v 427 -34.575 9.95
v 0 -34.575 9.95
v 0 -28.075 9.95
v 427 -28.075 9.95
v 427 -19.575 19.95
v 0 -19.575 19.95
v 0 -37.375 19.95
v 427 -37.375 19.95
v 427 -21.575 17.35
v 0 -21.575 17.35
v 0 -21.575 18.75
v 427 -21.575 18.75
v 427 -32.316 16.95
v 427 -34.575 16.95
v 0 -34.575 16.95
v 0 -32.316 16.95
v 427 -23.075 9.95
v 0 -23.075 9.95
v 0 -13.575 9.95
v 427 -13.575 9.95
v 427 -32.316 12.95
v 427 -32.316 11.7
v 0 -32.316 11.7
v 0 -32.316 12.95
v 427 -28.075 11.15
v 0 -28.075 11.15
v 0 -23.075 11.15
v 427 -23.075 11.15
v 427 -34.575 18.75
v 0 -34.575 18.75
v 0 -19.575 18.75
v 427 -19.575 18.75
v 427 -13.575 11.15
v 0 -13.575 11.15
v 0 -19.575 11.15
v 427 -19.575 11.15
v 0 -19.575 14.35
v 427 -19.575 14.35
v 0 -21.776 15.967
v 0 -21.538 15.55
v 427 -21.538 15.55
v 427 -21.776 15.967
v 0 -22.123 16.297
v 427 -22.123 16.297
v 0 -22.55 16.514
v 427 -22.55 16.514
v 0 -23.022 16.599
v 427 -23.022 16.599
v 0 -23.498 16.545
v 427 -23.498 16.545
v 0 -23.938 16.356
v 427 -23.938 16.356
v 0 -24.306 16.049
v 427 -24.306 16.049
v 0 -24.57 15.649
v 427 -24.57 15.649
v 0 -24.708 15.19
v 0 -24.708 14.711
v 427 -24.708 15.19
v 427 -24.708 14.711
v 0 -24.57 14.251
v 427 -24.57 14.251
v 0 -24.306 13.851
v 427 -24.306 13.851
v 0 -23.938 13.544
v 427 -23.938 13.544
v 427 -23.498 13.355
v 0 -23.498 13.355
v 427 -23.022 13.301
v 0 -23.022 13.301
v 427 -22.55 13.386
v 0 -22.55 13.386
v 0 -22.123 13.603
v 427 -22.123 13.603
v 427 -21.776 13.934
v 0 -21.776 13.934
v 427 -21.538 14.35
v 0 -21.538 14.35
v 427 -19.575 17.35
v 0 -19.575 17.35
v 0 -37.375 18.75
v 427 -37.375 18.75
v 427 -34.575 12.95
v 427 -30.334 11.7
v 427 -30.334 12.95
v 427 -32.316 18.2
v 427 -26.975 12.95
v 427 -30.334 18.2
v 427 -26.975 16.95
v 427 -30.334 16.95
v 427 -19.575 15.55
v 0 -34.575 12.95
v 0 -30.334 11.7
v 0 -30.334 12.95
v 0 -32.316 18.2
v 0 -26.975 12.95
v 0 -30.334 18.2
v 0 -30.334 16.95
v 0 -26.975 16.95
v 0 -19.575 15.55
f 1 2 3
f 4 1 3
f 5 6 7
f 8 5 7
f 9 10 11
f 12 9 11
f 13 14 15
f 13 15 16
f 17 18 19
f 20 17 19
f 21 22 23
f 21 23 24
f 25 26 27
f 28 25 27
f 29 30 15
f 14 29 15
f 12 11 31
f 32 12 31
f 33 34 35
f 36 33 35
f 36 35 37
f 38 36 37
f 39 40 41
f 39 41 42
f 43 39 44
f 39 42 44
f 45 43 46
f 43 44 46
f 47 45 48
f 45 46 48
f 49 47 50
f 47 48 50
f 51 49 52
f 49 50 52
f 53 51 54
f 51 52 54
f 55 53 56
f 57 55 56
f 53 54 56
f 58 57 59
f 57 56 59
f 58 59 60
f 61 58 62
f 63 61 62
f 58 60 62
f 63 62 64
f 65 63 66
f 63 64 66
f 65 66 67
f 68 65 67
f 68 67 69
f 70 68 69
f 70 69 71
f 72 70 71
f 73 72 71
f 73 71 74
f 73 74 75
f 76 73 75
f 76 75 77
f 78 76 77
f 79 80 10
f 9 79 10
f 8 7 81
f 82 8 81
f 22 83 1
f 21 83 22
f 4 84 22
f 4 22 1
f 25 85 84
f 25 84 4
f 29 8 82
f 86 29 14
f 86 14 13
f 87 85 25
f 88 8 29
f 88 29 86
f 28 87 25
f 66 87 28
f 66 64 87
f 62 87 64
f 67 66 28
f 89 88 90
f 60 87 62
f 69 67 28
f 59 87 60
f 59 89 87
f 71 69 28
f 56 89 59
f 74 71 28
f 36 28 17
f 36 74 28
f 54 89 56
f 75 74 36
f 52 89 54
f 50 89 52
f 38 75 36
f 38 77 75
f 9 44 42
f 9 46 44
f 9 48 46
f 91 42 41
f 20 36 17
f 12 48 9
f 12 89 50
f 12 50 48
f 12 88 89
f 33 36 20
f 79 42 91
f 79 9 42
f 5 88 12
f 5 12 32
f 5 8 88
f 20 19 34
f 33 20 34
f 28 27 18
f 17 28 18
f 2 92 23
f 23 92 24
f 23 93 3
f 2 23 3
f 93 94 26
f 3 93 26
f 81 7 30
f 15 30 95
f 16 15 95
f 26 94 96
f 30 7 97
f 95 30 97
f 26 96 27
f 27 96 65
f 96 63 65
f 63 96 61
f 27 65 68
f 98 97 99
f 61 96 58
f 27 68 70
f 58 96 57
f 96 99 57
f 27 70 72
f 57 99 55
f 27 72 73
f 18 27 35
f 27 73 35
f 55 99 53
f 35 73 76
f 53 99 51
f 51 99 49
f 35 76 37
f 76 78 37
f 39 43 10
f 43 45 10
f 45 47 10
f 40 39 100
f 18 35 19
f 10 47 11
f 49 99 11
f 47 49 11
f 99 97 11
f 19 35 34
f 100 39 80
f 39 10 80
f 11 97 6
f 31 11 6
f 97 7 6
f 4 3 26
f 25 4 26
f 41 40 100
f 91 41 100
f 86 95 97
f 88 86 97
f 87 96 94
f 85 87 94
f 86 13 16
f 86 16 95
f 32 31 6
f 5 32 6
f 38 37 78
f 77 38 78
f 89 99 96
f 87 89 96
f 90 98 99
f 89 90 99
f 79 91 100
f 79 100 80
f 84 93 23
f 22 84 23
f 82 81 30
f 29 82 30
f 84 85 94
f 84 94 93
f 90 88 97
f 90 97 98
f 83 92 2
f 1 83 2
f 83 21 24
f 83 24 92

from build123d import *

# Parameters (mm, degrees)
F2_DEPTH = 427
F3_R     = 1.65
F4_DEPTH = 427


with BuildPart() as f2:
    # F1 (on Right) → F2 (new body)
    with BuildSketch(Plane.YZ):
        Polygon((-37.3753120244, 19.9501804985), (-37.3753120244, 18.7501804985), (-34.5753120244, 18.7501804985), (-34.5753120244, 16.9501804985), (-32.3157645762, 16.9501804985), (-32.3157645762, 18.2001804985), (-30.3341764957, 18.2001804985), (-30.3341764957, 16.9501804985), (-26.9753120244, 16.9501804985), (-26.9753120244, 12.9501804985), (-30.3341764957, 12.9501804985), (-30.3341764957, 11.7001804985), (-32.3157645762, 11.7001804985), (-32.3157645762, 12.9501804985), (-34.5753120244, 12.9501804985), (-34.5753120244, 9.9501804985), (-28.0753120244, 9.9501804985), (-28.0753120244, 11.1501804985), (-23.0753120244, 11.1501804985), (-23.0753120244, 9.9501804985), (-13.5753120244, 9.9501804985), (-13.5753120244, 11.1501804985), (-19.5753120244, 11.1501804985), (-19.5753120244, 14.3501804985), (-21.5753120244, 14.3501804985), (-21.5753120244, 15.5501804985), (-19.5753120244, 15.5501804985), (-19.5753120244, 17.3501804985), (-21.5753120244, 17.3501804985), (-21.5753120244, 18.7501804985), (-19.5753120244, 18.7501804985), (-19.5753120244, 19.9501804985), (-21.5753120244, 19.9501804985), align=None)
    extrude(amount=F2_DEPTH)

    # F3 (on face) → F4 (cut)
    with BuildSketch(Plane.YZ.offset(427)):
        with Locations((-23.0753120244, 14.9501804985)):
            Circle(F3_R)
    extrude(amount=-F4_DEPTH, mode=Mode.SUBTRACT)


solid = f2.part
